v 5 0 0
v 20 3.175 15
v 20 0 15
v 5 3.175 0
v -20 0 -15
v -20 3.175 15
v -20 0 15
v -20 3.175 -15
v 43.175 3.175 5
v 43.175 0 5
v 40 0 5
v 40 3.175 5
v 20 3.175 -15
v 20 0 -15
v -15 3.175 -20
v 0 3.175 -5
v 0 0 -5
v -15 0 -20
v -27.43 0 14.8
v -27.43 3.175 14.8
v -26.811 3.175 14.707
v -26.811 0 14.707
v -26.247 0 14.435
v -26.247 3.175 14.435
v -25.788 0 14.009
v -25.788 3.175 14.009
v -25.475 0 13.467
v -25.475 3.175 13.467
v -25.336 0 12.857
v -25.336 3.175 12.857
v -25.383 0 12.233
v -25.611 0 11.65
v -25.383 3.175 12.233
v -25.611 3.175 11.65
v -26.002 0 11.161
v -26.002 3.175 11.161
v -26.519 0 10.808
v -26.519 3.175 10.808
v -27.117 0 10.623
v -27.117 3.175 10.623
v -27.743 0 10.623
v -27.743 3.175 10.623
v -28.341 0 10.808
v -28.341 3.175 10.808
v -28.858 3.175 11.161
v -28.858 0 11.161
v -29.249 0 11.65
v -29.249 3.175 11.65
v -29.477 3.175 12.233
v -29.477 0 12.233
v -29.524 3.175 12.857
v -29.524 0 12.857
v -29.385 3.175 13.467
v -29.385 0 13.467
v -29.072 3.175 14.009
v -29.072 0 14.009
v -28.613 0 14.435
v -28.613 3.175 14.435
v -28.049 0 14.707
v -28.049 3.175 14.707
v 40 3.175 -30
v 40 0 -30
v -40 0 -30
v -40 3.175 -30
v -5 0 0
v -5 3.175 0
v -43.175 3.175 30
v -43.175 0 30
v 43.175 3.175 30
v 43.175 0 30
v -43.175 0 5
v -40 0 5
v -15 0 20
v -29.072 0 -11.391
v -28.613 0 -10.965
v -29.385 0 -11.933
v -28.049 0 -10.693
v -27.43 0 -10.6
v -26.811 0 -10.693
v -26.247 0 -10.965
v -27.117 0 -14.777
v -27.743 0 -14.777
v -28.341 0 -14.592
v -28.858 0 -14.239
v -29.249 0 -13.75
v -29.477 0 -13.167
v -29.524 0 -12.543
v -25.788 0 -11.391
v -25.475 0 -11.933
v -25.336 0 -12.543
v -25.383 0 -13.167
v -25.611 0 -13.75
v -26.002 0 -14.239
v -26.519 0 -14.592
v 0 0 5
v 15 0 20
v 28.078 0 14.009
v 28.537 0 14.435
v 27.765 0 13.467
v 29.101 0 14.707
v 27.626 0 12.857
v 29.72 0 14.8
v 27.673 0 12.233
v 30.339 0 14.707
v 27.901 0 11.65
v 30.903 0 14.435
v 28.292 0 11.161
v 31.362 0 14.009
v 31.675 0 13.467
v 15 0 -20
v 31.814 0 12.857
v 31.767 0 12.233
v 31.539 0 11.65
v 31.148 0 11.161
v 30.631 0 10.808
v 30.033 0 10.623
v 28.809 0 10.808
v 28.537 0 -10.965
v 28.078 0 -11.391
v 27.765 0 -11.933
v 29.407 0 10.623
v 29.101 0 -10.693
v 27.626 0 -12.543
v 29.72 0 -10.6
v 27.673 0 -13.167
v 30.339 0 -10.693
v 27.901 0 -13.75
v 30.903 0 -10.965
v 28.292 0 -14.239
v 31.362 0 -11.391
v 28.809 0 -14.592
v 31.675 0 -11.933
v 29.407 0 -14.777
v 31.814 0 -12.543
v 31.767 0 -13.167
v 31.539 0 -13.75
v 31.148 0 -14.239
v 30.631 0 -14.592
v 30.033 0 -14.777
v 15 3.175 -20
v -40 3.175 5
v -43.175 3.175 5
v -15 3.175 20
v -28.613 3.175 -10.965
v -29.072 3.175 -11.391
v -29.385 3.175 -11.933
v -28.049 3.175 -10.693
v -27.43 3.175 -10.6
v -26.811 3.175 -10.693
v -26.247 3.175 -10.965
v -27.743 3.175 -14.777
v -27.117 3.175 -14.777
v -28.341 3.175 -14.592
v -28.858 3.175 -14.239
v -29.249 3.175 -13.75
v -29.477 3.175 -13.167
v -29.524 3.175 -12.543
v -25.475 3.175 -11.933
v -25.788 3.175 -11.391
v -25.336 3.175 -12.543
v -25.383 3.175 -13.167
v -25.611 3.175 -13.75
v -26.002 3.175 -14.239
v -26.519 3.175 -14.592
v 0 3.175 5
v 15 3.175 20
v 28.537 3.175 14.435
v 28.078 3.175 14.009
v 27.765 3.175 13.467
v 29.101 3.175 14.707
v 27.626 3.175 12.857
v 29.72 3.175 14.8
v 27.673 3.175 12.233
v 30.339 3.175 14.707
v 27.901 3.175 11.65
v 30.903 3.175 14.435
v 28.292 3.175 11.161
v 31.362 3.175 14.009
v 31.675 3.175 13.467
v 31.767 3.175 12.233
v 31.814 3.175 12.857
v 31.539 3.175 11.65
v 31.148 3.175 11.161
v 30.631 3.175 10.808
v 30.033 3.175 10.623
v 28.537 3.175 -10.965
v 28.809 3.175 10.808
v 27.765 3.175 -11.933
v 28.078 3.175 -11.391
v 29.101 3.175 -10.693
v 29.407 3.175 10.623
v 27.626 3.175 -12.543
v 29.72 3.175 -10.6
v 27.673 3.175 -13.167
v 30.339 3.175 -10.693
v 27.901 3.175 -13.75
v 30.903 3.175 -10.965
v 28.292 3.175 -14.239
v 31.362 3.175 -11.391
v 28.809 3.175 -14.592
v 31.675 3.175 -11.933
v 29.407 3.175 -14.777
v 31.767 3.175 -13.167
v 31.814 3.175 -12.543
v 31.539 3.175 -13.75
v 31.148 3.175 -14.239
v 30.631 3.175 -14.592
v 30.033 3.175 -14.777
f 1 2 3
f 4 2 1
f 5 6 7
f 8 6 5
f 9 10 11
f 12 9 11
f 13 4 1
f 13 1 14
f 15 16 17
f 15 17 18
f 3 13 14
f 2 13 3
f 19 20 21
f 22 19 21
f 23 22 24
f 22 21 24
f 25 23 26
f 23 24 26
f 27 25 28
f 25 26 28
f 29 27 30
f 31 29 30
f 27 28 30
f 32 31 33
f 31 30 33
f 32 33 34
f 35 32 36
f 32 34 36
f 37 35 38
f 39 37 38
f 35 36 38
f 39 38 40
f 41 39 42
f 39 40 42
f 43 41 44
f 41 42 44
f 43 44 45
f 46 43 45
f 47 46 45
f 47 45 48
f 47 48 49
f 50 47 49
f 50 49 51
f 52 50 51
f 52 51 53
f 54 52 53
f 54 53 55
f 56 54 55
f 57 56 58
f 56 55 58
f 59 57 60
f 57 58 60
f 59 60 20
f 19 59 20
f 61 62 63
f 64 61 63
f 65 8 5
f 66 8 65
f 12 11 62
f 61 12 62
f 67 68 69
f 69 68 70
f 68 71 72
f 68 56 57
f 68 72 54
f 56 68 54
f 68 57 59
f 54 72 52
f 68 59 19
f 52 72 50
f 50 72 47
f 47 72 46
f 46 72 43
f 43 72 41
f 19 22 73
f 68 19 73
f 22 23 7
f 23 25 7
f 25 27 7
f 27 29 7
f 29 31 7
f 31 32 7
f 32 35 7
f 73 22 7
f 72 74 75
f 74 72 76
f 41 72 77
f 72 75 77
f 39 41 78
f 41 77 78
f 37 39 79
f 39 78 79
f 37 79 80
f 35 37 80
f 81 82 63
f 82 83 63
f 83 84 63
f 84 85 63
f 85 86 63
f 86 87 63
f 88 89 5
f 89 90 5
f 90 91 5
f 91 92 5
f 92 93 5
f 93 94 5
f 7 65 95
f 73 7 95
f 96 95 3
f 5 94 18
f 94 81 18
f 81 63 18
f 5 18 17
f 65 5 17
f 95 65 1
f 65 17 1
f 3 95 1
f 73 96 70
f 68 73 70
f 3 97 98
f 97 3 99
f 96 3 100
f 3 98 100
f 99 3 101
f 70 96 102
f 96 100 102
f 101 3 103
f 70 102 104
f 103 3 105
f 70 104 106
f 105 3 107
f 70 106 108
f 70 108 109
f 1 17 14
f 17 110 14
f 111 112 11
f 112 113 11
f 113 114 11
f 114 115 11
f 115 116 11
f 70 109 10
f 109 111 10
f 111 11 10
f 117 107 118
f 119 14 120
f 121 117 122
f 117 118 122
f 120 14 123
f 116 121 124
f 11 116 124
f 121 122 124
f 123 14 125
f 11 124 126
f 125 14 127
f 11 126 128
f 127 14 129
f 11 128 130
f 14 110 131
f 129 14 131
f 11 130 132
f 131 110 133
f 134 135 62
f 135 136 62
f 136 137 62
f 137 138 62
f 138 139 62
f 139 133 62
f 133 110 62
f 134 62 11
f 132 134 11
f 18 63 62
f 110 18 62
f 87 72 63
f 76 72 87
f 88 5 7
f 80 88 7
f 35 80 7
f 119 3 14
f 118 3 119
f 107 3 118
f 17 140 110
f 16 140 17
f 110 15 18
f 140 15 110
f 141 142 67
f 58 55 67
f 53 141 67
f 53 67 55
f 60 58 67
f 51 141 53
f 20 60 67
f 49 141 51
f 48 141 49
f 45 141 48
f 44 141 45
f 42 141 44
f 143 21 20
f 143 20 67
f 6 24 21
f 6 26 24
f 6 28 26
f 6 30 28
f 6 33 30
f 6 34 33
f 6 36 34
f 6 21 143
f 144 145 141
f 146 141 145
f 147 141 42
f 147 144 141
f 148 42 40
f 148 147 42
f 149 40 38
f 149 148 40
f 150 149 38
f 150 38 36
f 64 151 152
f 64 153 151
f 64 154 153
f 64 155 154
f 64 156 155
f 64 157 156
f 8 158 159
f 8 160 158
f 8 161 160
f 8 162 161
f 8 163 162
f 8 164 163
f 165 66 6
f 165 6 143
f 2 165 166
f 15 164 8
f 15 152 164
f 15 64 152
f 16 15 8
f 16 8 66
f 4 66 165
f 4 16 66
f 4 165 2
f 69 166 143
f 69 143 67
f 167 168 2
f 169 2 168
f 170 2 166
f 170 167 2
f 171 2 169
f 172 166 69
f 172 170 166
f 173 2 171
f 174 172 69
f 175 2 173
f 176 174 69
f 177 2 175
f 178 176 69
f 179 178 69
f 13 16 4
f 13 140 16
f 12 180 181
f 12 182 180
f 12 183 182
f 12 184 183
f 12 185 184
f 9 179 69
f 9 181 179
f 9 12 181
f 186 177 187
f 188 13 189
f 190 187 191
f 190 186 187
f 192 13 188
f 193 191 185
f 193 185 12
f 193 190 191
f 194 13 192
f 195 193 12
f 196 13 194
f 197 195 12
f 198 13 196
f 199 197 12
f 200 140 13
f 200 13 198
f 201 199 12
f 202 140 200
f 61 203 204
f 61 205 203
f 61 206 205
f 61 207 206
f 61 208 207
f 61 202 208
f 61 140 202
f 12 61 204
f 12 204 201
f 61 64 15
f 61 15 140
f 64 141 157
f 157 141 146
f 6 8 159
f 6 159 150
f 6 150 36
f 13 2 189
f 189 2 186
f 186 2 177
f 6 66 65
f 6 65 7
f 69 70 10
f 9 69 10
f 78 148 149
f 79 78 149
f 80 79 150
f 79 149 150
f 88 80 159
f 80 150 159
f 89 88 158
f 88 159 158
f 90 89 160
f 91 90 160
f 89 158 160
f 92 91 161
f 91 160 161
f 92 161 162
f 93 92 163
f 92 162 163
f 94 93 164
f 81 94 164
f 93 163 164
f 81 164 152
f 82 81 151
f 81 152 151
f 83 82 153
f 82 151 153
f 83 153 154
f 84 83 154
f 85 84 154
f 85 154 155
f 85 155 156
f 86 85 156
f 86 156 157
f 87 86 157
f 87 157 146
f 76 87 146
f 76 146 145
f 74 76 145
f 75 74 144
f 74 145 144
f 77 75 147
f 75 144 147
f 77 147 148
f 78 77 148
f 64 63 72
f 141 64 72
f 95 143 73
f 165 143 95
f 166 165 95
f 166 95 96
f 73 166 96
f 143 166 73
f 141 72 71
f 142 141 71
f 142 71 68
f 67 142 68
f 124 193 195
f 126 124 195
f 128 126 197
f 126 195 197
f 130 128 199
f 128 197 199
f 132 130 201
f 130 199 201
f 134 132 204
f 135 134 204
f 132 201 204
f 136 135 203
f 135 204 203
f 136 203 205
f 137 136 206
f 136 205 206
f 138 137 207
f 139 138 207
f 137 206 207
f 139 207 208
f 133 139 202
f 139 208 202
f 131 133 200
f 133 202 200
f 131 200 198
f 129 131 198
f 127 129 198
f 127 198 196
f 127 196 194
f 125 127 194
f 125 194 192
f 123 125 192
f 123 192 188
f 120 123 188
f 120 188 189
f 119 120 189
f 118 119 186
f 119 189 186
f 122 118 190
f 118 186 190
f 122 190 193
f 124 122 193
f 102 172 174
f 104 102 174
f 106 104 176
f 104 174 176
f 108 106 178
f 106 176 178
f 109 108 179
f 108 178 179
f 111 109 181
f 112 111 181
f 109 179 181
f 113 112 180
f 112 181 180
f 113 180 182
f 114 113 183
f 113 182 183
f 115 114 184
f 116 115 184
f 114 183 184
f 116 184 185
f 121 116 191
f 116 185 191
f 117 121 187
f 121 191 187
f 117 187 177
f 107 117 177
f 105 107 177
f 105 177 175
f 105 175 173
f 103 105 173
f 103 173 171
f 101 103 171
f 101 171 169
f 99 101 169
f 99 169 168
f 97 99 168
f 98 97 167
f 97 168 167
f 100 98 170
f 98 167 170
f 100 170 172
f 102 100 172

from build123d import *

# Parameters (mm, degrees)
BOSS_EXTRUDE1_DEPTH = 3.175
SKETCH2_R           = 2.1
CUT_EXTRUDE1_DEPTH  = 3.175
CUT_EXTRUDE2_DEPTH  = 3.175


with BuildPart() as part:
    # Sketch1 → Boss-Extrude1 (new body)
    with BuildSketch(Plane(origin=(0, 0, 0), x_dir=(1, 0, 0), z_dir=(0, 1, 0))):
        Polygon((-43.175, -5), (-43.175, -30), (43.175, -30), (43.175, -5), (40, -5), (40, 30), (-40, 30), (-40, -5), align=None)
    extrude(amount=BOSS_EXTRUDE1_DEPTH)

    # Sketch2 → Cut-Extrude1 (cut)
    with BuildSketch(Plane(origin=(0, 3.175, 0), x_dir=(1, 0, 0), z_dir=(0, 1, 0))):
        with Locations(Location((-27.43, 12.7, 0), (0, 0, 270))):
            Circle(SKETCH2_R)
        with Locations(Location((29.72, 12.7, 0), (0, 0, 270))):
            Circle(SKETCH2_R)
        with Locations(Location((29.72, -12.7, 0), (0, 0, 270))):
            Circle(SKETCH2_R)
        with Locations(Location((-27.43, -12.7, 0), (0, 0, 270))):
            Circle(SKETCH2_R)
    extrude(amount=-CUT_EXTRUDE1_DEPTH, mode=Mode.SUBTRACT)

    # Sketch3 → Cut-Extrude2 (cut)
    with BuildSketch(Plane(origin=(0, 3.175, 0), x_dir=(1, 0, 0), z_dir=(0, 1, 0))):
        Polygon((-20, -15), (-20, 15), (-5, 0), align=None)
        Polygon((0, 5), (-15, 20), (15, 20), align=None)
        Polygon((5, 0), (20, 15), (20, -15), align=None)
        Polygon((0, -5), (15, -20), (-15, -20), align=None)
    extrude(amount=-CUT_EXTRUDE2_DEPTH, mode=Mode.SUBTRACT)


solid = part.part
